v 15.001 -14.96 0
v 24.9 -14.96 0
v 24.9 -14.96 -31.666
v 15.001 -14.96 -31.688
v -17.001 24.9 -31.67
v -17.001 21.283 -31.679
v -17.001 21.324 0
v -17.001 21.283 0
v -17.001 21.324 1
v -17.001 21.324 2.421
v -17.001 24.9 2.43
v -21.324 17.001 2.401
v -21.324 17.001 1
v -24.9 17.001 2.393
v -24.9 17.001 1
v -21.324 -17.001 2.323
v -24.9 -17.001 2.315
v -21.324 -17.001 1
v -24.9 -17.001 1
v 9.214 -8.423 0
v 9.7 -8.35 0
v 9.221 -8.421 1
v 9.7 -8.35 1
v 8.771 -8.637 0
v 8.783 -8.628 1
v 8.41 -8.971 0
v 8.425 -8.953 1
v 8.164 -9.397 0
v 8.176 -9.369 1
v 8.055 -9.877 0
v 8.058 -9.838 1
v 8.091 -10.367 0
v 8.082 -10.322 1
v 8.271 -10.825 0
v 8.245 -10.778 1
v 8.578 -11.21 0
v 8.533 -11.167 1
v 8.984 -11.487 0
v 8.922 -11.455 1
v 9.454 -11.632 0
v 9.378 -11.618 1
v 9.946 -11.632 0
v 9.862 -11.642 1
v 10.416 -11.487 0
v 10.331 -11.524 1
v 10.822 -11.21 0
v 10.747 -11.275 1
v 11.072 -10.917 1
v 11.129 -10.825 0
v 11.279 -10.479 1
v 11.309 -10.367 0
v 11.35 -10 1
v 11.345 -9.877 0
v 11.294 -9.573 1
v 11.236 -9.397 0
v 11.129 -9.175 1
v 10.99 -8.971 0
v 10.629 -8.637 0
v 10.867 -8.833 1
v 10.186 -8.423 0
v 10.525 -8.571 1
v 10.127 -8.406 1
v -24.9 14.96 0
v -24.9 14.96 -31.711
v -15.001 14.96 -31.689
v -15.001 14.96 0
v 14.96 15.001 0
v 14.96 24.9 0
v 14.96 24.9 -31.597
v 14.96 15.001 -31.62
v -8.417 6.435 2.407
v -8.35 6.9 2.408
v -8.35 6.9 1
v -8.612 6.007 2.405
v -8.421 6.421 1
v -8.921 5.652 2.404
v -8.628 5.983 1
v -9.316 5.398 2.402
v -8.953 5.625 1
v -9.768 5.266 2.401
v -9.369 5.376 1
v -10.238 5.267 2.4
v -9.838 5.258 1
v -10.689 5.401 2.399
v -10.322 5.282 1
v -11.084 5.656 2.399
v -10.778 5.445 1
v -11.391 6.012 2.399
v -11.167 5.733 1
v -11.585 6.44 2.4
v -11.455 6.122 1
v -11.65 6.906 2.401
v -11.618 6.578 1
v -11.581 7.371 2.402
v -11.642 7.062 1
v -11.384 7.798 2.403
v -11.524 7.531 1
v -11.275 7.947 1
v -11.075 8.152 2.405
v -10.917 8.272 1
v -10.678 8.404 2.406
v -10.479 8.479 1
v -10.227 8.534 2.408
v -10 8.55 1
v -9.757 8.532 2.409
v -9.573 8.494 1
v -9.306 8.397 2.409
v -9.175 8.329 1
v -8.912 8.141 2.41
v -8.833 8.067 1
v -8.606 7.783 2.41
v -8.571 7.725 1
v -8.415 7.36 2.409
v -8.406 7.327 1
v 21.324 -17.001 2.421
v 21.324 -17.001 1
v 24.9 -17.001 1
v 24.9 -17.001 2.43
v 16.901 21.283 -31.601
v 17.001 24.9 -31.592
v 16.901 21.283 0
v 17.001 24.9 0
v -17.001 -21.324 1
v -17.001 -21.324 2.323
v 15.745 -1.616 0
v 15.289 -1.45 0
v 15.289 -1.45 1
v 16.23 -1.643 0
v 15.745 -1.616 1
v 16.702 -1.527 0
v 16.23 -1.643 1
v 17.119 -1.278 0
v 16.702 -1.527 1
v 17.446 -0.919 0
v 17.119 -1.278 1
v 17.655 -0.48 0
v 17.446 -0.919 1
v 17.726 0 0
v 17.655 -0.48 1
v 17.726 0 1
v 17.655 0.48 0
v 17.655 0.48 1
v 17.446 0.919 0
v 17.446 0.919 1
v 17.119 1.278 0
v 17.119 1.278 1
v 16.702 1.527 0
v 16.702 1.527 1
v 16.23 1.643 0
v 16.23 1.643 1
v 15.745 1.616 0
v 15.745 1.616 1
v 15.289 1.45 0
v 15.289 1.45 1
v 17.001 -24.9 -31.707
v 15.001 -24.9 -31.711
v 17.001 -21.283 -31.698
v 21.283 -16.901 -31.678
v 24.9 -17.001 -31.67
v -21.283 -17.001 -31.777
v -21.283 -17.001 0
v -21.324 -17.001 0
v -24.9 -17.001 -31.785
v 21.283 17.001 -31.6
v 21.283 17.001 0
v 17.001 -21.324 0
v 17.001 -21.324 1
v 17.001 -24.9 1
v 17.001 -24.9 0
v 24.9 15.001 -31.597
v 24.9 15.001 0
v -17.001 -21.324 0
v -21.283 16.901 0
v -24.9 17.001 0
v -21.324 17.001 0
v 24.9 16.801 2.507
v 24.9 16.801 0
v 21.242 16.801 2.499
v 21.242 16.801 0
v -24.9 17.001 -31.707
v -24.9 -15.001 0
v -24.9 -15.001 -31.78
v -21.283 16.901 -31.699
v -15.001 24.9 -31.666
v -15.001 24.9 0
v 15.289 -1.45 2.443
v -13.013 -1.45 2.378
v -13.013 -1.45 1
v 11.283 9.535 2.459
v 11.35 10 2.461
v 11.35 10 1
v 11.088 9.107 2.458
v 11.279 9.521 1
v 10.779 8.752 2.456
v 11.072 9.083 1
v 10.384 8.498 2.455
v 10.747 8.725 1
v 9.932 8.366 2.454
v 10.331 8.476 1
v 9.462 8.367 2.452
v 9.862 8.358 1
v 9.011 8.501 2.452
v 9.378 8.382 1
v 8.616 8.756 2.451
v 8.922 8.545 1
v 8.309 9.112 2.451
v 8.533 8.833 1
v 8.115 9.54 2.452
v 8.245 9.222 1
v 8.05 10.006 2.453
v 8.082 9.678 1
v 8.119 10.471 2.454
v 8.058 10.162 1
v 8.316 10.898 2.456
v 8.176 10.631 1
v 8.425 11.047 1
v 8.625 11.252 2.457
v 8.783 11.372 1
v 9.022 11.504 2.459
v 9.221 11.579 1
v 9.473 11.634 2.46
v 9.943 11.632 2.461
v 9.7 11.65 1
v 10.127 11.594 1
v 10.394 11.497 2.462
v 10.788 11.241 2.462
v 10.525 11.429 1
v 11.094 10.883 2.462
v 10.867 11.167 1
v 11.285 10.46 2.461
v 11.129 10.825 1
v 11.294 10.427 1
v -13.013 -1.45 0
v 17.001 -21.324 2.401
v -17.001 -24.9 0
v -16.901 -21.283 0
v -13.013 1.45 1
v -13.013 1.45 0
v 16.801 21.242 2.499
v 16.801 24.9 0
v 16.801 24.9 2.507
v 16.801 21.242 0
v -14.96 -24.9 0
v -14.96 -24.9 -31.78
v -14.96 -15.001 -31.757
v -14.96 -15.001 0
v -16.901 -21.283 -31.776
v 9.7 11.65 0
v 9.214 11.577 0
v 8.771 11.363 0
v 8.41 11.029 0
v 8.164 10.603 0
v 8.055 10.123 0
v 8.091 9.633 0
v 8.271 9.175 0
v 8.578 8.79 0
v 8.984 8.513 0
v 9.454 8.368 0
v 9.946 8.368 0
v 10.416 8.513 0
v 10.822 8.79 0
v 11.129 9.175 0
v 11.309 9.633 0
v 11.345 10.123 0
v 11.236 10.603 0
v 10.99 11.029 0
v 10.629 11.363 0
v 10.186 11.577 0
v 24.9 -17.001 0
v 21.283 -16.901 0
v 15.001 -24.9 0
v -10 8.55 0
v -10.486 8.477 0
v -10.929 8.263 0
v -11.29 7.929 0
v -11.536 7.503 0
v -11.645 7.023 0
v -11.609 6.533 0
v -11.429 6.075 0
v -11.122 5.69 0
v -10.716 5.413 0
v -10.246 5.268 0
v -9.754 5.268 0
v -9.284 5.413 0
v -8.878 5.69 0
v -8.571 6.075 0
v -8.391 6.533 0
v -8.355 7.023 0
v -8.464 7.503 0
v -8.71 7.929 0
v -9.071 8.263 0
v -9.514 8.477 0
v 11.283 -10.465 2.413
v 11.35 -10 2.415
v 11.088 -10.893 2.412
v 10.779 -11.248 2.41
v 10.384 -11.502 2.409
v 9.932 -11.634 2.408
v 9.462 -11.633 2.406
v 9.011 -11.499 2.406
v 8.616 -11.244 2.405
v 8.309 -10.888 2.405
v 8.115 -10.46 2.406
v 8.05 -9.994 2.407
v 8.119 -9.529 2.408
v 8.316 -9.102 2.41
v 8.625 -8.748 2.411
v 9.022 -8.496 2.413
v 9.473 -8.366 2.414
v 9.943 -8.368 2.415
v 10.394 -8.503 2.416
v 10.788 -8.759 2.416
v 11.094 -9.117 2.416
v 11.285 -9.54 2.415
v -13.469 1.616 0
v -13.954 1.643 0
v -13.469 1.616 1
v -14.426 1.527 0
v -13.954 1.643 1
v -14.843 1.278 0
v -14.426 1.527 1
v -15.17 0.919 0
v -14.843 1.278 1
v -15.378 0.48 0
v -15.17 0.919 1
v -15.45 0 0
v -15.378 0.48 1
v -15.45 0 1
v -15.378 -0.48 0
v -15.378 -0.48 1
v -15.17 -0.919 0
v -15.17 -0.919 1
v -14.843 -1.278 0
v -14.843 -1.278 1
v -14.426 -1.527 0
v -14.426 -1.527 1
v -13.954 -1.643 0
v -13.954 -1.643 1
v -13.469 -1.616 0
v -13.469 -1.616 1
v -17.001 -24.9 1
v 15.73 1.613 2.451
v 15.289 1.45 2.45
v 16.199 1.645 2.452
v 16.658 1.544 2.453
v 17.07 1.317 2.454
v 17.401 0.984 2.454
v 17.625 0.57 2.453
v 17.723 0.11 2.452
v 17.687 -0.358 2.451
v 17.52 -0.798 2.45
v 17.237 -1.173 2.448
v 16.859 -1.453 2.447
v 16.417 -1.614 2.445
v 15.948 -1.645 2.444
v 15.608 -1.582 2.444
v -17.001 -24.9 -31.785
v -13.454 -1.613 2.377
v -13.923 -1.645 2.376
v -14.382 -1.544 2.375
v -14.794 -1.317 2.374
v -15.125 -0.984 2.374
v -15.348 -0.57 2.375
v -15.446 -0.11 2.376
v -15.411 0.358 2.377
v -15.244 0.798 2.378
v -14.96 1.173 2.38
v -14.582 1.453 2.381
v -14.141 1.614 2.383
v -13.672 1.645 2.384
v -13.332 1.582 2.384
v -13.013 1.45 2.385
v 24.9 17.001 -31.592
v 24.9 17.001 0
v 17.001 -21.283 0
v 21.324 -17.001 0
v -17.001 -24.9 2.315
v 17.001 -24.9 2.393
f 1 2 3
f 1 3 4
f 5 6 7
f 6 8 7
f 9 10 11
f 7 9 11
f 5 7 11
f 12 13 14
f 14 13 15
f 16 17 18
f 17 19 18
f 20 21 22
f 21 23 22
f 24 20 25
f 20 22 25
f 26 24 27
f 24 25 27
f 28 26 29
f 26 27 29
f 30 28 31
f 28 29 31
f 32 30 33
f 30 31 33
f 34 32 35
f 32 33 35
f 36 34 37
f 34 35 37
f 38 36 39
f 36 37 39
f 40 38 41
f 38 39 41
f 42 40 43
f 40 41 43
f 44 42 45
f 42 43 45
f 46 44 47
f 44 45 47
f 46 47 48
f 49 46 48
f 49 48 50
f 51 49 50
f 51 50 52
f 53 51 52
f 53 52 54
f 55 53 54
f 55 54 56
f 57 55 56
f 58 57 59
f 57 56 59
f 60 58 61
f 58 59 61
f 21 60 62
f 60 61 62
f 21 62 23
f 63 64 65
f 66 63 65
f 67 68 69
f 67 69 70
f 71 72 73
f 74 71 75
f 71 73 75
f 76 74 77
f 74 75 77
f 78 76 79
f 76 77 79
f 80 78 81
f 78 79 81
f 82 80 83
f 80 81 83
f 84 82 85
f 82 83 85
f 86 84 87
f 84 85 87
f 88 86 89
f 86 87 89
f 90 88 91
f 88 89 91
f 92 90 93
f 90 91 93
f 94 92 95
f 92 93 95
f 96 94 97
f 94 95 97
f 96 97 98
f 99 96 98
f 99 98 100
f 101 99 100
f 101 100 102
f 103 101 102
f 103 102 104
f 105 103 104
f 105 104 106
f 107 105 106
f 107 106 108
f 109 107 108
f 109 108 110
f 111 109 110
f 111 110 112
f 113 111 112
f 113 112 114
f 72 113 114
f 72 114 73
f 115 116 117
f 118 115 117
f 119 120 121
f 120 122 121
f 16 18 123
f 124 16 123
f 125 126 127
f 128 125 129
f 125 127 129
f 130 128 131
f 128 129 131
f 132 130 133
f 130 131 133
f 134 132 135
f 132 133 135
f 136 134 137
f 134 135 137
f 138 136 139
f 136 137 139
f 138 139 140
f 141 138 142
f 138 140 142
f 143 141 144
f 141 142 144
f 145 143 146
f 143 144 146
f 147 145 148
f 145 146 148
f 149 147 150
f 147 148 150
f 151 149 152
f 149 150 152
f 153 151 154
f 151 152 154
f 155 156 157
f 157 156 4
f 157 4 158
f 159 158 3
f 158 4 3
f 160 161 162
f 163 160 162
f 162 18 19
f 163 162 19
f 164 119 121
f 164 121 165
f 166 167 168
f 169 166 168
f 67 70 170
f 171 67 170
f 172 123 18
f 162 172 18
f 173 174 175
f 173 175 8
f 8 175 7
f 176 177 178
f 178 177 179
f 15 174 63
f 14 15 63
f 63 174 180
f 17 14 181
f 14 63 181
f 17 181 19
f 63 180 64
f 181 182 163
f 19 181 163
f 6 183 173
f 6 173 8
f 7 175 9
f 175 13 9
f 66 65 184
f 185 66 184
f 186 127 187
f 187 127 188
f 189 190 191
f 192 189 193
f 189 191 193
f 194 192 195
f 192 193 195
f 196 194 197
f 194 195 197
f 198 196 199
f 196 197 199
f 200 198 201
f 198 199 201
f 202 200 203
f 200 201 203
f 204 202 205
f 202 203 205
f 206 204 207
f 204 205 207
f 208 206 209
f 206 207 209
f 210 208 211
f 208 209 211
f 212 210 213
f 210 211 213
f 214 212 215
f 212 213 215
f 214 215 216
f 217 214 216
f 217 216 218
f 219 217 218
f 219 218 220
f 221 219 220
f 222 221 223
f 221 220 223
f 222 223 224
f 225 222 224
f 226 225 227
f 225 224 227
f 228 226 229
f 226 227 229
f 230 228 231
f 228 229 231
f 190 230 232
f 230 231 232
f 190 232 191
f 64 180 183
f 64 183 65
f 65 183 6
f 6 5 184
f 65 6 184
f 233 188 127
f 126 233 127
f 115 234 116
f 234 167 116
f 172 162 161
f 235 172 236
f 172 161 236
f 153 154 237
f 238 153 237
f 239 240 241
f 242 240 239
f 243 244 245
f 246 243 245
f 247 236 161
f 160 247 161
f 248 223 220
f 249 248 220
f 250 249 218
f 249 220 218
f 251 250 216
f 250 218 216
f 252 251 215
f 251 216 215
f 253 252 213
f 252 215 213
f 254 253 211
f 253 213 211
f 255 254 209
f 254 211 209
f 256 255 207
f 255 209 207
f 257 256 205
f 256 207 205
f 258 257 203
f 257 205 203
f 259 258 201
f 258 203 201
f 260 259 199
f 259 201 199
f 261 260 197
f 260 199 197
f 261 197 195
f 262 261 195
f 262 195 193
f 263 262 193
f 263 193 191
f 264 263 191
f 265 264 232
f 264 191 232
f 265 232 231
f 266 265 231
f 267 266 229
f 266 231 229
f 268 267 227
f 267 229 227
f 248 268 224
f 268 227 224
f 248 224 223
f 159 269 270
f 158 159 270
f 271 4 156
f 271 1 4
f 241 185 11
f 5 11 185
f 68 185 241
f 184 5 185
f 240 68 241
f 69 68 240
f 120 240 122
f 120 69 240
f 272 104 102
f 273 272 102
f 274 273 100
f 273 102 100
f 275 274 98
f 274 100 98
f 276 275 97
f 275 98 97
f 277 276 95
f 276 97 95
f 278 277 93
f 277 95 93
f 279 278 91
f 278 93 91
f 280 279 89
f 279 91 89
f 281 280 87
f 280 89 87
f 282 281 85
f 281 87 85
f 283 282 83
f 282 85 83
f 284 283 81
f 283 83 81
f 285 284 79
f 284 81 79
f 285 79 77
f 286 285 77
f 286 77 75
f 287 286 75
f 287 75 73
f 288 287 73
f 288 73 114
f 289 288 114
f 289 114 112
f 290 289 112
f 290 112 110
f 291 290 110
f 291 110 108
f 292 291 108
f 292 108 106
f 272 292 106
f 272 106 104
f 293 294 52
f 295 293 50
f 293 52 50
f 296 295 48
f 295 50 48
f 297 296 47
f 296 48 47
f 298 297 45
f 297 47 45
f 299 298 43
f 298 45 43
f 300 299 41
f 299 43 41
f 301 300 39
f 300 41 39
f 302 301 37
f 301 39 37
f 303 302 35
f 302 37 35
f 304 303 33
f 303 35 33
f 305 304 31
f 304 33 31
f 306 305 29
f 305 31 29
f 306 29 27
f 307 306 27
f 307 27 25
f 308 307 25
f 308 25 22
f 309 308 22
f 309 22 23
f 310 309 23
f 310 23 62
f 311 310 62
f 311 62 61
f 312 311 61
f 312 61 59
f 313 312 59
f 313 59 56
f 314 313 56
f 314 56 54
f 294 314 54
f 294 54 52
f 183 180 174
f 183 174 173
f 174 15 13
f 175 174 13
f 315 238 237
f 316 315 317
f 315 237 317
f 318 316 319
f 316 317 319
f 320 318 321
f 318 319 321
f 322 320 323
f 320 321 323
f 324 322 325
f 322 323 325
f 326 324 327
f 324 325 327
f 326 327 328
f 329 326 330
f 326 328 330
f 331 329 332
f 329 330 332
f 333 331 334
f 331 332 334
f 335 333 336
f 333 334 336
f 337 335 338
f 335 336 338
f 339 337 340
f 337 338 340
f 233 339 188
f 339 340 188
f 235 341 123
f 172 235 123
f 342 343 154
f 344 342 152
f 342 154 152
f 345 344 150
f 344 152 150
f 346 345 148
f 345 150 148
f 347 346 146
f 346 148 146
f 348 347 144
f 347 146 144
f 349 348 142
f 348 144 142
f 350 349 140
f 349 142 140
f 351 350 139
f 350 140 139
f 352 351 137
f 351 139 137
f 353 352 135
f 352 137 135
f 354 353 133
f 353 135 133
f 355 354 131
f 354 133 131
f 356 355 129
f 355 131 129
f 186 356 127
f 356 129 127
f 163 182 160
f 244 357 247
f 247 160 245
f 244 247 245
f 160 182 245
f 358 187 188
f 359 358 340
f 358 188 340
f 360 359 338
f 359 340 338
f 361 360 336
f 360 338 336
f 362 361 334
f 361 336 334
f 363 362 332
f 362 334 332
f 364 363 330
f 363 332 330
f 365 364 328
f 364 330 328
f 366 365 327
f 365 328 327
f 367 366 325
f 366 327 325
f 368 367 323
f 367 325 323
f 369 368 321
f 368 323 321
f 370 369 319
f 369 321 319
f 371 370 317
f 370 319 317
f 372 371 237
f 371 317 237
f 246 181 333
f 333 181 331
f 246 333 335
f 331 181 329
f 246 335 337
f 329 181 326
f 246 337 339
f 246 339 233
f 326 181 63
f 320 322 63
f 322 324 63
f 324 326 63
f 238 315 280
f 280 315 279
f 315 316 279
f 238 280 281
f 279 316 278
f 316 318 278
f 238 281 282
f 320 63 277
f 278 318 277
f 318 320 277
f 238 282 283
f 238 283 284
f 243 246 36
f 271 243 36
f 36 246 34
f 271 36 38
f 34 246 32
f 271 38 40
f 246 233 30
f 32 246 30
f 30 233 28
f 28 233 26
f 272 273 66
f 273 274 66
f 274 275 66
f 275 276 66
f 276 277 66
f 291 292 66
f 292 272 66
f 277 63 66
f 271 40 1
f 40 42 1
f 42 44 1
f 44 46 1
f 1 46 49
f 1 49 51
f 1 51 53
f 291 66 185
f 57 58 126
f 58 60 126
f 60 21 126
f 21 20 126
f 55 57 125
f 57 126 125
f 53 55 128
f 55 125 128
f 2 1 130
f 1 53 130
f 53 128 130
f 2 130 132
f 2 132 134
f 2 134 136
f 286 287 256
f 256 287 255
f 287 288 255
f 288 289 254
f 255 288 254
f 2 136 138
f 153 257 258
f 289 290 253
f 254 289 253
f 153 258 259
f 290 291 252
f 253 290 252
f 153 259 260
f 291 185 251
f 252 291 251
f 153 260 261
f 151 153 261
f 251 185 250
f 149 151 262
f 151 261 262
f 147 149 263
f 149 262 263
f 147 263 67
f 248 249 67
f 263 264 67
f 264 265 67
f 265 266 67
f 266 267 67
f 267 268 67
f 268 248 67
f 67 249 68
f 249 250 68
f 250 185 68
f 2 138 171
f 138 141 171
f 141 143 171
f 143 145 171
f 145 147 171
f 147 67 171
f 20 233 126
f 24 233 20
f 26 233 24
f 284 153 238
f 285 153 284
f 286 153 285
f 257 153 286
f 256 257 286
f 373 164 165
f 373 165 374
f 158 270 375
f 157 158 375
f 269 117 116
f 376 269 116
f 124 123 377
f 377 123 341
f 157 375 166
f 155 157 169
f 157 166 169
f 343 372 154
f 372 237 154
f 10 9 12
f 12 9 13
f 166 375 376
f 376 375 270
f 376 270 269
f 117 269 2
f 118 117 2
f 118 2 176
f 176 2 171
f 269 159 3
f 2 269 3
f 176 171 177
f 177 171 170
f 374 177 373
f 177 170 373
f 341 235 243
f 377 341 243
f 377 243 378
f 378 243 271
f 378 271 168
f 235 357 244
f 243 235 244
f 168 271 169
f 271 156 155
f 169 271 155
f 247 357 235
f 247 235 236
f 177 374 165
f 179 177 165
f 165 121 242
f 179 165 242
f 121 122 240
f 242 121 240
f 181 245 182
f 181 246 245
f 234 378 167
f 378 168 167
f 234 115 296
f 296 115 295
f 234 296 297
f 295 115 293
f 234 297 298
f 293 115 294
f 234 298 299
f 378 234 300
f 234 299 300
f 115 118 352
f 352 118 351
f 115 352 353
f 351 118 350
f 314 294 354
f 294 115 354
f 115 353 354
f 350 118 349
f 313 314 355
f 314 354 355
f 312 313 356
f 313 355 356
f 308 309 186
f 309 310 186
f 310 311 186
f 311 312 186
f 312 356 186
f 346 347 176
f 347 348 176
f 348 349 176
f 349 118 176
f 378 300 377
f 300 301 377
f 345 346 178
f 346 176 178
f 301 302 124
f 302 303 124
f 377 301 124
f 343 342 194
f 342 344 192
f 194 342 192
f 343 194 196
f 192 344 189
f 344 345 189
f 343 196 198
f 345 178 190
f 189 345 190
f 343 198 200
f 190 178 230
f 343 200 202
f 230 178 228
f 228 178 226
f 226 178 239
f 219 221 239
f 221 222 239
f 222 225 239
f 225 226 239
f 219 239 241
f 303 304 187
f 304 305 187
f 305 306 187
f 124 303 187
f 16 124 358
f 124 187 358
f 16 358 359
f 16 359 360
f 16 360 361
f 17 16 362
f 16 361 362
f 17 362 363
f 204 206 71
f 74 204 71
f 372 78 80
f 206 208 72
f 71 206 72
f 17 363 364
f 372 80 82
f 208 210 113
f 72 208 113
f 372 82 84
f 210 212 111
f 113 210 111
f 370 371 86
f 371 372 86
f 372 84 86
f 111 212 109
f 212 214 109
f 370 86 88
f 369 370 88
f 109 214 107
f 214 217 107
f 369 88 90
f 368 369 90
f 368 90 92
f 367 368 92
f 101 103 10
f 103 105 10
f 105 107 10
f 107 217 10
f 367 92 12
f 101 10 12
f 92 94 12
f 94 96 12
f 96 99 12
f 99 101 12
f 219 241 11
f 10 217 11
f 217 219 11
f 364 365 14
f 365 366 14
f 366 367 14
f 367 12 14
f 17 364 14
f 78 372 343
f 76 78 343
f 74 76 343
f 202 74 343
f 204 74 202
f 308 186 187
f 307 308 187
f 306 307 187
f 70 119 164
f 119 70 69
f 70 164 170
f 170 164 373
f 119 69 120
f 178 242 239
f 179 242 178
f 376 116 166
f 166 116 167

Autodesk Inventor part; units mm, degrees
ref_plane "Work Plane1" through (-29.1, -14.5, 2.4) normal (0, 0, -1) x (0, 1, 0)
ref_plane "Work Plane2" through (-13.8999, -10.5497, 2.25) normal (0, 0, -1) x (0, 1, 0)
ref_plane "Work Plane4" through (-17.3325, -17.0101, 2.3331) normal (0.0023, 0.0023, -1) x (0, 1, 0.0023)
sketch "Sketch1" plane through (0, 0, 0) normal (0, 0, 1) x (1, 0, 0)
  line L0 (-34.86, 0) -> (34.86, 0) construction
  line L1 (0, -34.86) -> (0, 34.86) construction
  line L2 (0, 0) -> (11.1575, 11.1575) construction
  line L3 (0, 0) -> (15.7791, 0) construction
  line L4 (0, 24.9) -> (16.8009, 24.9)
  line L5 (16.8009, 24.9) -> (16.8009, 21.2415)
  line L6 (16.8009, 21.2415) -> (19.0212, 19.0212)
  line L7 (24.9, 0) -> (24.9, 16.8009)
  line L8 (24.9, 16.8009) -> (21.2415, 16.8009)
  line L9 (21.2415, 16.8009) -> (19.0212, 19.0212)
  line L10 (0, -24.9) -> (16.8009, -24.9)
  line L11 (16.8009, -24.9) -> (16.8009, -21.2415)
  line L12 (16.8009, -21.2415) -> (19.0212, -19.0212)
  line L13 (24.9, 0) -> (24.9, -16.8009)
  line L14 (24.9, -16.8009) -> (21.2415, -16.8009)
  line L15 (21.2415, -16.8009) -> (19.0212, -19.0212)
  line L16 (0, 24.9) -> (-16.8009, 24.9)
  line L17 (-16.8009, 24.9) -> (-16.8009, 21.2415)
  line L18 (-16.8009, 21.2415) -> (-19.0212, 19.0212)
  line L19 (-24.9, 16.8009) -> (-21.2415, 16.8009)
  line L20 (-21.2415, 16.8009) -> (-19.0212, 19.0212)
  line L21 (0, -24.9) -> (-16.8009, -24.9)
  line L22 (-16.8009, -24.9) -> (-16.8009, -21.2415)
  line L23 (-16.8009, -21.2415) -> (-19.0212, -19.0212)
  line L24 (-21.2415, -16.8009) -> (-19.0212, -19.0212)
  line L25 (-24.9, -16.8009) -> (-21.2415, -16.8009)
  line L26 (-24.9, 0) -> (-24.9, -16.8009)
  line L27 (-24.9, 0) -> (-24.9, 16.8009)
  circle A0 centre (0, 0) radius 10
  dimension "d0" = 45
  dimension "d2" = 24.9
  dimension "d3" = 3.14
  dimension "d4" = 26.9
  dimension "d5" = 20
extrude "Extrusion1" add sketch "Sketch1" along normal blind 1 contours L4 L5 L6 L9 L8 L7 L13 L14 L15 L12 L11 L10 L21 L22 L23 L24 L25 L26 L27 L19 L20 L18 L17 L16 | A0
sketch "Sketch5" plane through (0, 0, 0) normal (0, 0, -1) x (-1, 0, 0)
  circle A0 centre (-9.7, 10) radius 1.4
  circle A1 centre (-9.7, -10) radius 1.4
  circle A2 centre (13.8, 0) radius 1.4
  circle A3 centre (-10, 6.9) radius 0.75
  circle A4 centre (10, 6.9) radius 1.25
  point P0 (0, 0)
hole "Hole1" at (-13.8, 0, 0) at (9.7, -10, 0) at (-10, 6.9, 0) at (9.7, 10, 0) direction (0, 0, 1) diameter 3.3 depth 12 tip angle 118
sketch "Skizze6" plane through (-16.8009, 24.9, 1) normal (0, 0, 1) x (1, 0, 0)
  circle A0 centre (6.8009, -18) radius 1.65 construction
  circle A1 centre (3.0009, -24.9) radius 1.65 construction
  circle A2 centre (26.5009, -34.9) radius 1.65 construction
  circle A3 centre (26.5009, -14.9) radius 1.65 construction
  line L0 (33.6017, -3.6585) -> (33.6017, 0) projected
  line L1 (33.6017, 0) -> (0, 0) construction
  line L2 (0, 0) -> (0, -3.6585) projected
  line L3 (0, -3.6585) -> (-4.4406, -8.0991) projected
  line L4 (-4.4406, -8.0991) -> (-8.0991, -8.0991) projected
  line L5 (-8.0991, -8.0991) -> (-8.0991, -41.7009) construction
  line L6 (-8.0991, -41.7009) -> (-4.4406, -41.7009) projected
  line L7 (-4.4406, -41.7009) -> (0, -46.1415) projected
  line L8 (0, -46.1415) -> (0, -49.8) projected
  line L9 (0, -49.8) -> (33.6017, -49.8) construction
  line L10 (33.6017, -49.8) -> (33.6017, -46.1415) projected
  line L11 (33.6017, -46.1415) -> (38.0423, -41.7009) projected
  line L12 (38.0423, -41.7009) -> (41.7009, -41.7009) projected
  line L13 (41.7009, -41.7009) -> (41.7009, -8.0991) construction
  line L14 (41.7009, -8.0991) -> (38.0423, -8.0991) projected
  line L15 (38.0423, -8.0991) -> (33.6017, -3.6585) projected
  line L16 (-0.2, 0.2) -> (33.8017, 0.2) construction
  line L17 (33.8017, 0.2) -> (33.8017, -3.5757)
  line L18 (33.8017, -3.5757) -> (38.1252, -7.8991)
  line L19 (38.1252, -7.8991) -> (41.9009, -7.8991)
  line L20 (41.9009, -7.8991) -> (41.9009, -41.9009) construction
  line L21 (41.9009, -41.9009) -> (38.1252, -41.9009)
  line L22 (38.1252, -41.9009) -> (33.8017, -46.2243)
  line L23 (33.8017, -46.2243) -> (33.8017, -50)
  line L24 (33.8017, -50) -> (-0.2, -50) construction
  line L25 (-0.2, -50) -> (-0.2, -46.2243)
  line L26 (-0.2, -46.2243) -> (-4.5235, -41.9009)
  line L27 (-4.5235, -41.9009) -> (-8.2991, -41.9009)
  line L28 (-8.2991, -41.9009) -> (-8.2991, -7.8991) construction
  line L29 (-8.2991, -7.8991) -> (-4.5235, -7.8991)
  line L30 (-4.5235, -7.8991) -> (-0.2, -3.5757)
  line L31 (-0.2, -3.5757) -> (-0.2, 0.2)
  line L32 (-8.0991, -8.0991) -> (-8.0991, -7.8991)
  line L33 (0, 0) -> (-0.2, 0)
  line L34 (33.6017, 0) -> (33.8017, 0)
  line L35 (41.7009, -8.0991) -> (38.0423, -8.0991) projected
  line L36 (41.7009, -8.0991) -> (41.7009, -7.8991)
  line L37 (41.7009, -41.7009) -> (41.7009, -41.9009)
  line L38 (33.6017, -49.8) -> (33.8017, -49.8)
  line L39 (-8.0991, -41.7009) -> (-8.0991, -41.9009)
  line L40 (0, -49.8) -> (-0.2, -49.8)
  point P0 (16.8009, -24.9)
  dimension "d25" = 0.2
extrude "IM_offset" add sketch "Skizze6" against normal blind 1 contours L2 L3 L4 L32 L29 L30 L31 L33 | L6 L7 L8 L40 L25 L26 L27 L39 | L10 L11 L12 L37 L21 L22 L23 L38
sketch "Sketch7" plane through (-24.9, 16.9009, 1) normal (0, 0, 1) x (1, 0, 0)
  circle A0 centre (11.1, -16.9009) radius 1.65
  line L0 (11.1, -16.9009) -> (40.9762, -16.9009) construction
  line L1 (11.1, -18.3509) -> (40.9762, -18.3509)
  line L2 (40.9762, -15.4509) -> (11.1, -15.4509)
  arc A1 (11.1, -15.4509) -> (11.1, -18.3509) centre (11.1, -16.9009) ccw
  arc A2 (40.9762, -18.3509) -> (40.9762, -15.4509) centre (40.9762, -16.9009) ccw
  circle A3 centre (40.9762, -16.9009) radius 1.65
  point P0 (24.9, -16.9009)
  point P1 (26.0381, -16.9009)
  dimension "d28" = 2.9
extrude "Extrusion6" cut sketch "Sketch7" against normal blind 10 contours A0 L1 A1 L2 | A0 L2 A3 L1 | A3 L1 A2 L2 | L2 A2 L1 A3 picked at (11.65, -16.9009)
ref_plane "Work Plane3" through (-24.85, -16.97, -31.85) normal (0, 0, 1) x (1, 0, 0)
sketch "Sketch9" plane through (0, 0, 0) normal (0, 0, -1) x (-1, 0, 0)
  line L0 (21.2829, 16.9009) -> (17.0009, 21.2829)
  line L1 (17.0009, 21.2829) -> (17.0009, 24.9)
  line L2 (24.9, 17.0009) -> (21.2829, 16.9009)
  line L3 (24.9, -17.0009) -> (24.9, 17.0009) projected
  line L4 (17.0009, 24.9) -> (-16.8009, 24.9) projected
  line L5 (24.9, 14.96) -> (15.0009, 14.96)
  line L6 (15.0009, 14.96) -> (15.0009, 24.9)
  line L7 (15.0009, 24.9) -> (17.0009, 24.9)
  line L8 (24.9, 17.0009) -> (24.9, 14.96)
  line L9 (-16.9009, 21.2829) -> (-21.2829, 17.0009)
  line L10 (-21.2829, 17.0009) -> (-24.9, 17.0009)
  line L11 (-17.0009, 24.9) -> (-16.9009, 21.2829)
  line L12 (-14.96, 24.9) -> (-14.96, 15.0009)
  line L13 (-14.96, 15.0009) -> (-24.9, 15.0009)
  line L14 (-24.9, 15.0009) -> (-24.9, 17.0009)
  line L15 (-17.0009, 24.9) -> (-14.96, 24.9)
  line L16 (-21.2829, -16.9009) -> (-17.0009, -21.2829)
  line L17 (-17.0009, -21.2829) -> (-17.0009, -24.9)
  line L18 (-24.9, -17.0009) -> (-21.2829, -16.9009)
  line L19 (-24.9, -14.96) -> (-15.0009, -14.96)
  line L20 (-15.0009, -14.96) -> (-15.0009, -24.9)
  line L21 (-15.0009, -24.9) -> (-17.0009, -24.9)
  line L22 (-24.9, -17.0009) -> (-24.9, -14.96)
  line L23 (16.9009, -21.2829) -> (21.2829, -17.0009)
  line L24 (21.2829, -17.0009) -> (24.9, -17.0009)
  line L25 (17.0009, -24.9) -> (16.9009, -21.2829)
  line L26 (14.96, -24.9) -> (14.96, -15.0009)
  line L27 (14.96, -15.0009) -> (24.9, -15.0009)
  line L28 (24.9, -15.0009) -> (24.9, -17.0009)
  line L29 (17.0009, -24.9) -> (14.96, -24.9)
  point P0 (0, 0)
  dimension "d44" = 2
  dimension "d47" = 360
ref_plane "Work Plane5" through (-25.1325, -16.9302, -31.7852) normal (-0.0023, -0.0023, 1) x (1, 0, 0.0023)
extrude "Extrusion9" add sketch "Sketch9" along normal up to surface surface through (-25.1325, -16.9302, -31.7852) normal (-0.0023, -0.0023, 1)
ref_plane "Work Plane6" through (-16.5464, -17.0101, 2.3349) normal (0.0023, 0.0023, -1) x (0, 1, 0.0023)
sketch "Sketch11" plane through (0, 0, 1) normal (0, 0, 1) x (1, 0, 0)
  circle A0 centre (-10, 6.9) radius 1.65 projected
  circle A1 centre (9.7, 10) radius 1.65 projected
  circle A2 centre (9.7, -10) radius 1.65 projected
  arc A3 (-13.0126, 1.45) -> (-13.0126, -1.45) centre (-13.8, 0) ccw projected
  line L0 (-13.0126, 1.45) -> (15.2888, 1.45) projected
  line L1 (15.2888, -1.45) -> (-13.0126, -1.45) projected
  arc A4 (15.2888, -1.45) -> (15.2888, 1.45) centre (16.0762, 0) ccw projected
  line L2 (16.8009, 24.9) -> (-17.0009, 24.9) projected
  line L3 (-17.0009, 24.9) -> (-17.0009, 21.3243) projected
  line L4 (-17.0009, 21.3243) -> (-21.3243, 17.0009) projected
  line L5 (-21.3243, 17.0009) -> (-24.9, 17.0009) projected
  line L6 (-24.9, 17.0009) -> (-24.9, -17.0009) projected
  line L7 (-24.9, -17.0009) -> (-21.3243, -17.0009) projected
  line L8 (-21.3243, -17.0009) -> (-17.0009, -21.3243) projected
  line L9 (-17.0009, -21.3243) -> (-17.0009, -24.9) projected
  line L10 (-17.0009, -24.9) -> (17.0009, -24.9) projected
  line L11 (17.0009, -24.9) -> (17.0009, -21.3243) projected
  line L12 (17.0009, -21.3243) -> (21.3243, -17.0009) projected
  line L13 (21.3243, -17.0009) -> (24.9, -17.0009) projected
  line L14 (24.9, -17.0009) -> (24.9, 16.8009) projected
  line L15 (24.9, 16.8009) -> (21.2415, 16.8009) projected
  line L16 (21.2415, 16.8009) -> (16.8009, 21.2415) projected
  line L17 (16.8009, 21.2415) -> (16.8009, 24.9) projected
  circle A5 centre (9.7, 10) radius 1.65 projected
  circle A6 centre (9.7, -10) radius 1.65 projected
  line L18 (-13.0126, 1.45) -> (15.2888, 1.45) projected
  arc A7 (15.2888, -1.45) -> (15.2888, 1.45) centre (16.0762, 0) ccw projected
  line L19 (15.2888, -1.45) -> (-13.0126, -1.45) projected
  arc A8 (-13.0126, 1.45) -> (-13.0126, -1.45) centre (-13.8, 0) ccw projected
  circle A9 centre (-10, 6.9) radius 1.65 projected
  point P0 (0, 0)
ref_plane "Work Plane7" through (-24.4263, -24.8901, 2.298) normal (0.0023, 0.0023, -1) x (0, 1, 0.0023)
extrude "Extrusion11" add sketch "Sketch11" along normal up to surface surface through (-24.4263, -24.8901, 2.298) normal (0.0023, 0.0023, -1)
equation "\"BendRadius\" = Thickness"
equation "\"BendReliefWidth\" = Thickness"
equation "\"BendReliefDepth\" = 0.5 * Thickness"
equation "\"CornerReliefSize\" = 4 * Thickness"
equation "\"MinimumRemnant\" = 2 * Thickness"
equation "\"TransitionRadius\" = BendRadius"
equation "\"JacobiRadiusSize\" = Thickness"
equation "\"GapSize\" = Thickness"
equation "\"Thickness\" = 0.5"
properties part number "20_Cube_insert_AlliedVision_Alvium_v3"
